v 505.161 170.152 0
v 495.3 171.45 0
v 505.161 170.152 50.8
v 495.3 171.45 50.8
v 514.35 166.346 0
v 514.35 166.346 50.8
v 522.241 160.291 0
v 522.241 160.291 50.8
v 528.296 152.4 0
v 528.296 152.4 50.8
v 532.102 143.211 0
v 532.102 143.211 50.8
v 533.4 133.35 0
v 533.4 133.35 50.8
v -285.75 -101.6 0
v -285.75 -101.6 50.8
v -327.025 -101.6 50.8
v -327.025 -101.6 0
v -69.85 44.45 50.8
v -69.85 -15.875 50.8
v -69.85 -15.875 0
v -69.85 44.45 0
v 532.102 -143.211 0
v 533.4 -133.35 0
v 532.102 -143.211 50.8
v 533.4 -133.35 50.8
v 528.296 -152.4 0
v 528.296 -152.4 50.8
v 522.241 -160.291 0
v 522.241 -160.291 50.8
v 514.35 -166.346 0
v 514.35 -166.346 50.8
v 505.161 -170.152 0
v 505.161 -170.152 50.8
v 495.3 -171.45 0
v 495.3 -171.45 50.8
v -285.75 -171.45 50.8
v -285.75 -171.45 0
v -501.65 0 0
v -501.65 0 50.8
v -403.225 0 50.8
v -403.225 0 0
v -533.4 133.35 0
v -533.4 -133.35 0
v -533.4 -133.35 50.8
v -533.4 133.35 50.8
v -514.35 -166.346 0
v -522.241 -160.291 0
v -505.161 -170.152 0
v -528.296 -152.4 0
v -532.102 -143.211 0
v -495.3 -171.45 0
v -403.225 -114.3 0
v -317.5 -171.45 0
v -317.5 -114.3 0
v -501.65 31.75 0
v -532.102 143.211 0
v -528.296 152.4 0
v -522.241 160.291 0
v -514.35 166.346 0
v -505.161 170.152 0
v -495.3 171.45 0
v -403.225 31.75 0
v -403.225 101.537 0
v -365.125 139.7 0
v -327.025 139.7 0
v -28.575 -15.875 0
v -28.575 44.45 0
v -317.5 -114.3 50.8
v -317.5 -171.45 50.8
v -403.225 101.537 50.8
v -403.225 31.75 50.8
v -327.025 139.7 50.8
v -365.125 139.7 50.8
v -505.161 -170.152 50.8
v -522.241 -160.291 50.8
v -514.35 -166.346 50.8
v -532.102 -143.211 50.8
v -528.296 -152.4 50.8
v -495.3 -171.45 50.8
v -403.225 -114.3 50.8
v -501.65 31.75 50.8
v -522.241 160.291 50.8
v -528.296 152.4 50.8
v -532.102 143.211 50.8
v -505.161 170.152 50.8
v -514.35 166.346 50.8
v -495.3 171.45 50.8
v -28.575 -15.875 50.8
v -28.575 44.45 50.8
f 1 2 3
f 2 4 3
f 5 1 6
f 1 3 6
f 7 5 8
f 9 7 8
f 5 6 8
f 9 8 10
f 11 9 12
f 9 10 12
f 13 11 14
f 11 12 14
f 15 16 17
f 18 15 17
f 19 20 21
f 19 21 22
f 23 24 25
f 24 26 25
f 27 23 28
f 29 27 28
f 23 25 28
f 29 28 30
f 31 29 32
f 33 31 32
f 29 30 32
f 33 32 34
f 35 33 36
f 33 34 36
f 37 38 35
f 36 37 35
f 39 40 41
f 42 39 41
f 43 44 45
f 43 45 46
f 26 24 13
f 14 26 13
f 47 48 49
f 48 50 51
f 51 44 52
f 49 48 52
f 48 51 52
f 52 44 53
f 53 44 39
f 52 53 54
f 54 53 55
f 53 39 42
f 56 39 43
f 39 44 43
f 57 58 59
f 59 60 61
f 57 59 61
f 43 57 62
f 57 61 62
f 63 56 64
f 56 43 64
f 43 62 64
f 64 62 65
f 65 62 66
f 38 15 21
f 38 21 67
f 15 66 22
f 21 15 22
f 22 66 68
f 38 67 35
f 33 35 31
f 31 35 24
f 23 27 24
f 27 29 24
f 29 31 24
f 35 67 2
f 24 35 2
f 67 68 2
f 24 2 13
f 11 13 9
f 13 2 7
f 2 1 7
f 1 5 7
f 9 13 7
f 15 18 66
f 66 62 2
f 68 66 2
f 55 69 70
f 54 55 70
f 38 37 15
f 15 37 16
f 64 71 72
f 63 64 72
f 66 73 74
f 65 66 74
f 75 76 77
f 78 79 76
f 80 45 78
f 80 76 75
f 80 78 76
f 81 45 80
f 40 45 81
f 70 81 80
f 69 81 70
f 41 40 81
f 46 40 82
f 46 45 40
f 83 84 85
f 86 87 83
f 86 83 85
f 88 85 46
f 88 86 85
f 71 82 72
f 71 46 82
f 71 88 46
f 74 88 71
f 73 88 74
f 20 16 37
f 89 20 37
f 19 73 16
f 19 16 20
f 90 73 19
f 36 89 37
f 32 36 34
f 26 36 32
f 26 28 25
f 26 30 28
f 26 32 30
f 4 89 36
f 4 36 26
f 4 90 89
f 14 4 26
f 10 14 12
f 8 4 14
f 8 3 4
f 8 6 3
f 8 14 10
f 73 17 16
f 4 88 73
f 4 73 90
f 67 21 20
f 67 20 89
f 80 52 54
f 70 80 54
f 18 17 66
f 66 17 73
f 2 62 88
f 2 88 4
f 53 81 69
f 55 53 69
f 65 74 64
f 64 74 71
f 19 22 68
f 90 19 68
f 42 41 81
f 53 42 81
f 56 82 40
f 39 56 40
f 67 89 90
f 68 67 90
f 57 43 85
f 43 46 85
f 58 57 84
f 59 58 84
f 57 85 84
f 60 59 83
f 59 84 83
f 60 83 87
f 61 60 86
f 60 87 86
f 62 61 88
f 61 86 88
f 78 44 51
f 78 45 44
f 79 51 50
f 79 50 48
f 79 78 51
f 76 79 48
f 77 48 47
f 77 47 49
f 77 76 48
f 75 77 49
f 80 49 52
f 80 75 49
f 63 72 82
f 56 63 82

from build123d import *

# Parameters (mm, degrees)
F0_W     = 1066.8
F0_H     = 342.9
F1_DEPTH = 50.8
F2_W     = 41.275
F2_H     = 60.325
F3_DEPTH = 50.8
F4_R     = 38.1


with BuildPart() as f1:
    # F0 (on Top) → F1 (new body)
    with BuildSketch(Plane.XY):
        Rectangle(F0_W, F0_H)
    extrude(amount=F1_DEPTH)

    # F2 (on face) → F3 (cut)
    with BuildSketch(Plane.XY.offset(50.8)):
        Polygon((-317.5, -114.3), (-317.5, -171.45), (-285.75, -171.45), (-285.75, -101.6), (-327.025, -101.6), (-327.025, 139.7), (-365.125, 139.7), (-403.225, 101.537321), (-403.225, 31.75), (-501.65, 31.75), (-501.65, 0), (-403.225, 0), (-403.225, -114.3), align=None)
        with Locations((-49.2125, 14.2875)):
            Rectangle(F2_W, F2_H)
    extrude(amount=-F3_DEPTH, mode=Mode.SUBTRACT)

    # F4
    f4_edges = [f1.edges().sort_by_distance(p)[0] for p in [
        (-533.4, 171.45, 25.4),
        (-533.4, -171.45, 25.4),
        (533.4, 171.45, 25.4),
        (533.4, -171.45, 25.4),
    ]]
    fillet(f4_edges, radius=F4_R)


solid = f1.part
